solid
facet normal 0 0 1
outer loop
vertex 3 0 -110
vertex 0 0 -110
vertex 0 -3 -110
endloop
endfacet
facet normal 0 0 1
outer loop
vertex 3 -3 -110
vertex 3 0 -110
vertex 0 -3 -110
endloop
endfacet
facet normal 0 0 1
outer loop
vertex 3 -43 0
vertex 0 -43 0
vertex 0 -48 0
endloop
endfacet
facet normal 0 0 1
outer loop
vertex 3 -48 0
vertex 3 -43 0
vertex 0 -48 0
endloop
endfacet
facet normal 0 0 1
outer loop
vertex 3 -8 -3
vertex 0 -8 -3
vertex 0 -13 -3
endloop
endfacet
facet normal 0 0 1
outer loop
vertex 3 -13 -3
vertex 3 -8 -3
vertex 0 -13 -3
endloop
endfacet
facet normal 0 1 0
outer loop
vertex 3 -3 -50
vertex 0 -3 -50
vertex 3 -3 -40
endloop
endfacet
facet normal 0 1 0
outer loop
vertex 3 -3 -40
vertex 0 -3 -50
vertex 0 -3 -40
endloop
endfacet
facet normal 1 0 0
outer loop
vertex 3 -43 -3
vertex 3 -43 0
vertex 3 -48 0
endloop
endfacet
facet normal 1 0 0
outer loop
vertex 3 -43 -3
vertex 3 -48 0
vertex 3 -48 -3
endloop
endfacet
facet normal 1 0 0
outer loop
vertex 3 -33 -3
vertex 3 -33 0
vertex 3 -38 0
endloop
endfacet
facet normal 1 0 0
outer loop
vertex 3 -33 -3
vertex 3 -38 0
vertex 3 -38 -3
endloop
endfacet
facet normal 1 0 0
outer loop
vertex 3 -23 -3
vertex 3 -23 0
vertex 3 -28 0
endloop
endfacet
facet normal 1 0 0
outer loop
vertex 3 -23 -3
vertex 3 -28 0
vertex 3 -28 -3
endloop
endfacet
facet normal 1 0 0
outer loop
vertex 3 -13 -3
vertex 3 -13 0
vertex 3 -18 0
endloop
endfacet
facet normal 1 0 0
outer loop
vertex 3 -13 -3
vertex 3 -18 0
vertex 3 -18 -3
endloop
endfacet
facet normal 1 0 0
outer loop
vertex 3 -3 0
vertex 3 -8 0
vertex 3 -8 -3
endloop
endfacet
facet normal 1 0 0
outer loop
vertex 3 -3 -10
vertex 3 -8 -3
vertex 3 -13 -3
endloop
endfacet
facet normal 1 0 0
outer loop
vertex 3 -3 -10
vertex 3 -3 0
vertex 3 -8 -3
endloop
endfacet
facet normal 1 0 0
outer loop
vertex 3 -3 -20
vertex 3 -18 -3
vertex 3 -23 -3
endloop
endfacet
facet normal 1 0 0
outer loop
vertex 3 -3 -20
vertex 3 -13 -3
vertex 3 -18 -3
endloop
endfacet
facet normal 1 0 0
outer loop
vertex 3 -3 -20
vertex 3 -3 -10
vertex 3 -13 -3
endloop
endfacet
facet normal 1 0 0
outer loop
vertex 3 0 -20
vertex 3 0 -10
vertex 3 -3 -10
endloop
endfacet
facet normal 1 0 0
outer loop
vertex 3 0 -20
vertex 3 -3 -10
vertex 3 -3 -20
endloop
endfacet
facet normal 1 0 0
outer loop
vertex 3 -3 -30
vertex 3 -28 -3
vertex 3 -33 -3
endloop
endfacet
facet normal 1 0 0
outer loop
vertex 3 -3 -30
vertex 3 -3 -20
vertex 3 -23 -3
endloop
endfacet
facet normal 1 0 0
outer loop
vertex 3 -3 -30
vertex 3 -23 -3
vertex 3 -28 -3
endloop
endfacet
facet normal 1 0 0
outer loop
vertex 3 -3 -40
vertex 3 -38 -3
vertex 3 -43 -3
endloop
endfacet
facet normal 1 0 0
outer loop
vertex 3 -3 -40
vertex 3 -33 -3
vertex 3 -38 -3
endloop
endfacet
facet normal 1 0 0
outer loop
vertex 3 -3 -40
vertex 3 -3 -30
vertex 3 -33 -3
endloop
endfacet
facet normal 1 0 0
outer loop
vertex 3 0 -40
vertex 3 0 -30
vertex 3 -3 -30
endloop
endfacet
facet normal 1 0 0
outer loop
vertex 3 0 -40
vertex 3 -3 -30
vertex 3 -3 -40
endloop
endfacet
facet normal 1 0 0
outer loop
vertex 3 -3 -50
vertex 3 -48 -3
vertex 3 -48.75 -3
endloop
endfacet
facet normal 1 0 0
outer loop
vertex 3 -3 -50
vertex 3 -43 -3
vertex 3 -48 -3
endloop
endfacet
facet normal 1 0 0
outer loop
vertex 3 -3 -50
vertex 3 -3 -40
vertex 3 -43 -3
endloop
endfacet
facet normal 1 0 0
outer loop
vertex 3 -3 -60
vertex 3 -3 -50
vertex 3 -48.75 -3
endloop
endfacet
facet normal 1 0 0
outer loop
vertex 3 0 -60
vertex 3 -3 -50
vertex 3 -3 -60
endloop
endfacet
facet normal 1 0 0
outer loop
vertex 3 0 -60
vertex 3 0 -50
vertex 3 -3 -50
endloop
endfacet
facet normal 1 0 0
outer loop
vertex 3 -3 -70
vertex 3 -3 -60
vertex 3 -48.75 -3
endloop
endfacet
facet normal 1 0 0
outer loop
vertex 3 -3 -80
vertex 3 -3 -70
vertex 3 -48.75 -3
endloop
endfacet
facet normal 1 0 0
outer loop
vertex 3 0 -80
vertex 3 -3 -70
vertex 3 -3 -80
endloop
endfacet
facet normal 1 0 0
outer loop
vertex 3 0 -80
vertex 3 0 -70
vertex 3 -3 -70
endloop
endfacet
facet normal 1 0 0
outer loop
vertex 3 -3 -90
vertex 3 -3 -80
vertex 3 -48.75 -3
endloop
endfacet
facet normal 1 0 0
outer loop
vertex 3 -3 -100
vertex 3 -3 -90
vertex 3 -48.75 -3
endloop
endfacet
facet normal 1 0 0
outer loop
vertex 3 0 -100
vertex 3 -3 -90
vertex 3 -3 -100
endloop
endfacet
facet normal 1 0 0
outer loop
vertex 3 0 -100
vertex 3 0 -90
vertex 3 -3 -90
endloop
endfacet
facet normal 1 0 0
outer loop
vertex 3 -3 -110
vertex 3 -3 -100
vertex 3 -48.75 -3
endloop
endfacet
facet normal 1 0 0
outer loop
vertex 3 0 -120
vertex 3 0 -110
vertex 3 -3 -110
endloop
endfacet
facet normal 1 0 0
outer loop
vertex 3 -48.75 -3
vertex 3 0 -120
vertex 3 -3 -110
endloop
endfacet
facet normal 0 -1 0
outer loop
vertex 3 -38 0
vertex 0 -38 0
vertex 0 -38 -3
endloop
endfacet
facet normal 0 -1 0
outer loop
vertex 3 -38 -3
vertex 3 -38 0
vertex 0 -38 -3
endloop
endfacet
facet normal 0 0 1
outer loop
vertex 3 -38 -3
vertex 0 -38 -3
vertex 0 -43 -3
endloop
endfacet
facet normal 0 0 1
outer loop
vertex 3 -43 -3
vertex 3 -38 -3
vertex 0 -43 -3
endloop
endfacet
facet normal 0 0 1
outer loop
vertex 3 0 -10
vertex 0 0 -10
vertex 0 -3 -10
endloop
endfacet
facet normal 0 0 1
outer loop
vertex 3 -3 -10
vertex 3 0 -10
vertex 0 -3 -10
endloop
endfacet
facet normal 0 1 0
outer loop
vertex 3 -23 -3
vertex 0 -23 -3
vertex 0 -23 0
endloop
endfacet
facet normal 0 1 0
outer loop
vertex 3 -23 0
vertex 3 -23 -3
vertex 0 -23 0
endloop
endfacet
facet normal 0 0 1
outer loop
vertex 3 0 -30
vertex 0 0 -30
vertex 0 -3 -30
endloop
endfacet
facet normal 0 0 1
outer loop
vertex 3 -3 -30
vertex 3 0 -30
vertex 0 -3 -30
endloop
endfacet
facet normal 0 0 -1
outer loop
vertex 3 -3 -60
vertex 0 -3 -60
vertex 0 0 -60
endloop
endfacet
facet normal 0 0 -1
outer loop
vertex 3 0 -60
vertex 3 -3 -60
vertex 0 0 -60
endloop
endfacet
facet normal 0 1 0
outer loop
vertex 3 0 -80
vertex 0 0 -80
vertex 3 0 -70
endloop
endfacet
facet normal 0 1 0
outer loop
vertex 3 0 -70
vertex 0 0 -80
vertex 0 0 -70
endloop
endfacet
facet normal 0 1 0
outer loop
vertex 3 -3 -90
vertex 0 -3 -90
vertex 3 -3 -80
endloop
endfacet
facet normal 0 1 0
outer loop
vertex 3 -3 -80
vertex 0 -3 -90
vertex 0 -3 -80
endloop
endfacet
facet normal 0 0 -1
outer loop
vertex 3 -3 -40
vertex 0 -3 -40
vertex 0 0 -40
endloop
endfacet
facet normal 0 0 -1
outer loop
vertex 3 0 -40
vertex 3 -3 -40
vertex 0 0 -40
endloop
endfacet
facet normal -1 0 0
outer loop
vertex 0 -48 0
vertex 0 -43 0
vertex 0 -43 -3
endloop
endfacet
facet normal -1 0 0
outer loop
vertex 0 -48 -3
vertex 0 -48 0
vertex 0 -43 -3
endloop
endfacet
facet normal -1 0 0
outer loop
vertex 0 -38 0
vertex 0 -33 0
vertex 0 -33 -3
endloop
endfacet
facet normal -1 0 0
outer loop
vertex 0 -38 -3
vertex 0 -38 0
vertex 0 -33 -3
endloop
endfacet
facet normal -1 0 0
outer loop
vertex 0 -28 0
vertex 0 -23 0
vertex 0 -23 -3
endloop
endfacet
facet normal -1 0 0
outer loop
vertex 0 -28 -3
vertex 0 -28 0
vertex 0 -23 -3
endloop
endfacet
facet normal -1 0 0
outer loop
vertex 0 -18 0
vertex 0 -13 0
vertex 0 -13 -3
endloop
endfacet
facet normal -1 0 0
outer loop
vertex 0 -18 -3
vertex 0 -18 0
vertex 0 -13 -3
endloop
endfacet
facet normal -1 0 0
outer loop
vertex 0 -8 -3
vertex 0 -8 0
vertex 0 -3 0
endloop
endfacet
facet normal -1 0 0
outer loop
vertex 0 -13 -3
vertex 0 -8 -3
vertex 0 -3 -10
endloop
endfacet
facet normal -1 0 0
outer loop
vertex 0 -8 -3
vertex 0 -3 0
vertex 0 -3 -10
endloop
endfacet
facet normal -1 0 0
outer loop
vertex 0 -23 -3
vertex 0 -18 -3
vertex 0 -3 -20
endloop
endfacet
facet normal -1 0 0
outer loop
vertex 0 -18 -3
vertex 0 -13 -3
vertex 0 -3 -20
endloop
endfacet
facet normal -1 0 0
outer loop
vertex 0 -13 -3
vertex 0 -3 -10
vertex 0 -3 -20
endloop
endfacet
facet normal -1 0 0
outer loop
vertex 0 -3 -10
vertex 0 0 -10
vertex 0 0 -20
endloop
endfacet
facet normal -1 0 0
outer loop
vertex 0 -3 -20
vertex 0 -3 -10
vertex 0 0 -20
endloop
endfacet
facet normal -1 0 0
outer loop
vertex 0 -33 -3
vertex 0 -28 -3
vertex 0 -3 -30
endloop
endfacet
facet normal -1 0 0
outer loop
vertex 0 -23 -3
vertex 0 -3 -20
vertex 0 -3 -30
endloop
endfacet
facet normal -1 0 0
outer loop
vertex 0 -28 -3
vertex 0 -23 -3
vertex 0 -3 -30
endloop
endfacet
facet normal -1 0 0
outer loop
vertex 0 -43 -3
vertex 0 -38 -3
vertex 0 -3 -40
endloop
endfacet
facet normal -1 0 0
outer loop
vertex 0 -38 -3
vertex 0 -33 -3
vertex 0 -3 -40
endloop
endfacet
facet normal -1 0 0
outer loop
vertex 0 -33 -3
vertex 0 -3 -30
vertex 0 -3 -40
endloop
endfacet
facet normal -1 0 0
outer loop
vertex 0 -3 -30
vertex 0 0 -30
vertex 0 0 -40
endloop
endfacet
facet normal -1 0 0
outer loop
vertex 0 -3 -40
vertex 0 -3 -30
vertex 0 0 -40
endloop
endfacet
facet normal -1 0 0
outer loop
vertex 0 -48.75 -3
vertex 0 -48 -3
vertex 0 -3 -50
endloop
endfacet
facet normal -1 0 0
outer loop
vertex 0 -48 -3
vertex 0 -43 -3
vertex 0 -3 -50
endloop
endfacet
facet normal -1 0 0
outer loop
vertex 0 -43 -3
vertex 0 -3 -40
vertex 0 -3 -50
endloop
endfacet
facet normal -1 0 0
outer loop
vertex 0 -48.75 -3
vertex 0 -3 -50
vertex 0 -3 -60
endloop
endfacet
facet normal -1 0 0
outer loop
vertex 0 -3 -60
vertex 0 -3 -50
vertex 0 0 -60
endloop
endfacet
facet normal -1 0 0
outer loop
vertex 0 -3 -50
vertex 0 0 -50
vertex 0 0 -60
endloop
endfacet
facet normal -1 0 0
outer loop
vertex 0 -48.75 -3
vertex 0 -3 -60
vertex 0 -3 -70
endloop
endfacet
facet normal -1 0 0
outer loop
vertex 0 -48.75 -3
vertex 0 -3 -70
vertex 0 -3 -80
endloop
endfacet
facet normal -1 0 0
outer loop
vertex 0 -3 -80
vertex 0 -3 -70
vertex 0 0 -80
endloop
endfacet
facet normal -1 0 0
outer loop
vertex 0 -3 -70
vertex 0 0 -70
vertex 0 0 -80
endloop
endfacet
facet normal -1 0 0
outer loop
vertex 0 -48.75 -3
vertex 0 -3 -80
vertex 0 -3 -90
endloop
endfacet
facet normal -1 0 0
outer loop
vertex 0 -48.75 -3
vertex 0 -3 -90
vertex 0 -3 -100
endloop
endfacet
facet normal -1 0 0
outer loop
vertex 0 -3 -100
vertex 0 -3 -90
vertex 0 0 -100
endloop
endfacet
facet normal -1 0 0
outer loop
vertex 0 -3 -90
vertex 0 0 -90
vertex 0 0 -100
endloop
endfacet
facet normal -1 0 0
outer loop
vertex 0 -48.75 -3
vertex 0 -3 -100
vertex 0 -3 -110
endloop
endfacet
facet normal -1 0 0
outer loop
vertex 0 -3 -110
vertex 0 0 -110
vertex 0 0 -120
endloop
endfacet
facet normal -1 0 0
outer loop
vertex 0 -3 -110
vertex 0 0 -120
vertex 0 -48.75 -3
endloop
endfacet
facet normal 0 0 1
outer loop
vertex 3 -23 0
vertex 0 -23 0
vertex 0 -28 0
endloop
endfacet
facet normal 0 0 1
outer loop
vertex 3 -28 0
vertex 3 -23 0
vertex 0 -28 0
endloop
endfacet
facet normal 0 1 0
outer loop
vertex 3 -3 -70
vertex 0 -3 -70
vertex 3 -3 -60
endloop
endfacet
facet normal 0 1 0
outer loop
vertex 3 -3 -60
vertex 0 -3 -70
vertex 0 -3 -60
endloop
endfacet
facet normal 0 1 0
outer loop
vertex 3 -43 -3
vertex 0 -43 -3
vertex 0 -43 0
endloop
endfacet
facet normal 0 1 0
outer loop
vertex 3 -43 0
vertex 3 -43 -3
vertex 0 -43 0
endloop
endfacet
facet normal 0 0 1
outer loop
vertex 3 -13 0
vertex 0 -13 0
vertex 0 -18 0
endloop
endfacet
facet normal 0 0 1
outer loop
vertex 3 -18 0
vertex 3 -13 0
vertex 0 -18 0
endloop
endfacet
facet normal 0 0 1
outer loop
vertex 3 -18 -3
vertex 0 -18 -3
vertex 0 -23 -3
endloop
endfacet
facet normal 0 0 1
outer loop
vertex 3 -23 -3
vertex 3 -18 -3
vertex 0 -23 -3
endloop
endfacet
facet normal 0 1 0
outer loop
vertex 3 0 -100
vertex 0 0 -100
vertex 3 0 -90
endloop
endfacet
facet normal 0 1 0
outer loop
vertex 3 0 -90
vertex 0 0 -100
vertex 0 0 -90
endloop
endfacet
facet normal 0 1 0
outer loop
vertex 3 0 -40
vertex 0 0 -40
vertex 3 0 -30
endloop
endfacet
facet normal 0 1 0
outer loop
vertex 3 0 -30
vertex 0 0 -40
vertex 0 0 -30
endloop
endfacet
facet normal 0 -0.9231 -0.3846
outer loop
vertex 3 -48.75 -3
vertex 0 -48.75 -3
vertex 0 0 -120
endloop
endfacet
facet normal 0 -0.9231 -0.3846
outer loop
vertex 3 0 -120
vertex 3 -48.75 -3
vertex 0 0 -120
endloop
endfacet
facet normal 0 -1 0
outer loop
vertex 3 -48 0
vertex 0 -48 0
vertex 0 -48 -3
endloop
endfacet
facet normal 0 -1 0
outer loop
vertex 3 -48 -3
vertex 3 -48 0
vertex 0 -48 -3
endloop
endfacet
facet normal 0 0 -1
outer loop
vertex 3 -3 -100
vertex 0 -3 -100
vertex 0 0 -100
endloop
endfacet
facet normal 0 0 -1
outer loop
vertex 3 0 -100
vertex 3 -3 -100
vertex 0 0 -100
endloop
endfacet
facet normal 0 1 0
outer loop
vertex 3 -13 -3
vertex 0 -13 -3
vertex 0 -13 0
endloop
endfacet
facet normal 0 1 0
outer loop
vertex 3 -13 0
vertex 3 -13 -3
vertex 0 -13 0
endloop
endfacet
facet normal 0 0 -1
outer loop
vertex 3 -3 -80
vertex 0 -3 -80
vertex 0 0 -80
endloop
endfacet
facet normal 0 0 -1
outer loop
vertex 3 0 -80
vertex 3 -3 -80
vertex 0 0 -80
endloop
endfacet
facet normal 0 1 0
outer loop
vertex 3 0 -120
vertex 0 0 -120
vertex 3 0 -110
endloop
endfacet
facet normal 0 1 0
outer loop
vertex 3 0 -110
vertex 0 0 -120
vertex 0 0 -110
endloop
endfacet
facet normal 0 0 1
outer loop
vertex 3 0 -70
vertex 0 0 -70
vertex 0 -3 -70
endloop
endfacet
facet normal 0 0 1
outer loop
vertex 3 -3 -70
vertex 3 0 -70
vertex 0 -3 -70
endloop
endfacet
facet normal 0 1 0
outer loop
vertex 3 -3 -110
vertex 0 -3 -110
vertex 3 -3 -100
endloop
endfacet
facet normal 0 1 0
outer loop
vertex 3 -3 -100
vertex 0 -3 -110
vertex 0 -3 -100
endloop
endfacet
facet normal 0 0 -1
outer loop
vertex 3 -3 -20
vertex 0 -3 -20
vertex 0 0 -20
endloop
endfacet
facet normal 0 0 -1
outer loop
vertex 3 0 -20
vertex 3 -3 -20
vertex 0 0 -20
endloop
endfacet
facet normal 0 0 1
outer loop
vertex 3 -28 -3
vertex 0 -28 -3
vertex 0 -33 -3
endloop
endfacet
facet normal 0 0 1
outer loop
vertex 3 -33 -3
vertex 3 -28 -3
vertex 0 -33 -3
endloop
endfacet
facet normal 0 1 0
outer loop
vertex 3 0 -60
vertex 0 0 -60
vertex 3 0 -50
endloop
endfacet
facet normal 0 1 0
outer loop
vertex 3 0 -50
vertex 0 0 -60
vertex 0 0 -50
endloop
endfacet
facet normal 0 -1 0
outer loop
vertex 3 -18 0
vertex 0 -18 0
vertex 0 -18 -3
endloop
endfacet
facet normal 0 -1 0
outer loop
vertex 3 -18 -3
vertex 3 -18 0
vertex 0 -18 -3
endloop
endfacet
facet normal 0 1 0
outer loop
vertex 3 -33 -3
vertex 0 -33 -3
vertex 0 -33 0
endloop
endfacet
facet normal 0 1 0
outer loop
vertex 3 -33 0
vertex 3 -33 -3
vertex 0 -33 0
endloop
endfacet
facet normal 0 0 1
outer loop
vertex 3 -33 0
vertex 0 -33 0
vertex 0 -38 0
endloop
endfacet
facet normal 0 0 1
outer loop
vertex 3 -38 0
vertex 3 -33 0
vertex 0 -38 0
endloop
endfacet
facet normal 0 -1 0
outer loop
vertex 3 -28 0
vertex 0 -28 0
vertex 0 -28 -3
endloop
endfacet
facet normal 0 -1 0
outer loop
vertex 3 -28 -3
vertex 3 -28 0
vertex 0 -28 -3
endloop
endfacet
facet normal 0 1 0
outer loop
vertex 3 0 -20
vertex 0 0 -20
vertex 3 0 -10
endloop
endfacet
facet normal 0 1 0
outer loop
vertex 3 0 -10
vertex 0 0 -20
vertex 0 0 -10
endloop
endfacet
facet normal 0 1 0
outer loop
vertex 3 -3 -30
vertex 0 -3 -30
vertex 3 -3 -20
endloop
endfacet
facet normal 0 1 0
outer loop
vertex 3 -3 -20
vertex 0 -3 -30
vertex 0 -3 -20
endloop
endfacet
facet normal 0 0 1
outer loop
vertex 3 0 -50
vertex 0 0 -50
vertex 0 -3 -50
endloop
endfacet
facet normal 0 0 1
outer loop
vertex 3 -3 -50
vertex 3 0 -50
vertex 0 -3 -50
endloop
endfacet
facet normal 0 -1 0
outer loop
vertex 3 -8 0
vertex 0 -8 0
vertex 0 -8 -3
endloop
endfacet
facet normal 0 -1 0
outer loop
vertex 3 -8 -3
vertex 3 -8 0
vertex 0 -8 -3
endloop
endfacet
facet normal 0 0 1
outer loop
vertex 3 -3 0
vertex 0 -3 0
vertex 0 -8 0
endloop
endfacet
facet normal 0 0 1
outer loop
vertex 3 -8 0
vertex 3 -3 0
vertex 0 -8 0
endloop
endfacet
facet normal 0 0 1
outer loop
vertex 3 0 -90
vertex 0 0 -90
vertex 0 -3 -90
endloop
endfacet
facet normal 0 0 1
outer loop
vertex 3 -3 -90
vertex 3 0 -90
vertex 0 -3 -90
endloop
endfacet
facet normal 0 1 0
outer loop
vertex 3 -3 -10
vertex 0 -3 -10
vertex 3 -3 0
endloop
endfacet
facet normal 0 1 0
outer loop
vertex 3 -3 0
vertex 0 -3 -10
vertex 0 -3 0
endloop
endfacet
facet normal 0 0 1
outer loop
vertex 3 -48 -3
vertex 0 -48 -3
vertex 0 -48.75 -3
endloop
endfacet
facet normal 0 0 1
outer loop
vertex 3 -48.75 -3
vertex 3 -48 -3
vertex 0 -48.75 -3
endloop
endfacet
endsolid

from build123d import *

# Parameters (mm, degrees)
BOSS_EXTRUDE1_DEPTH = 3


with BuildPart() as part:
    # Sketch1 → Boss-Extrude1 (new body)
    with BuildSketch(Plane(origin=(0, 0, 0), x_dir=(0, 0, -1), z_dir=(1, 0, 0))):
        Polygon((10, -3), (0, -3), (0, -8), (3, -8), (3, -13), (0, -13), (0, -18), (3, -18), (3, -23), (0, -23), (0, -28), (3, -28), (3, -33), (0, -33), (0, -38), (3, -38), (3, -43), (0, -43), (0, -48), (3, -48), (3, -48.75), (120, 0), (110, 0), (110, -3), (100, -3), (100, 0), (90, 0), (90, -3), (80, -3), (80, 0), (70, 0), (70, -3), (60, -3), (60, 0), (50, 0), (50, -3), (40, -3), (40, 0), (30, 0), (30, -3), (20, -3), (20, 0), (10, 0), align=None)
    extrude(amount=BOSS_EXTRUDE1_DEPTH)


solid = part.part
